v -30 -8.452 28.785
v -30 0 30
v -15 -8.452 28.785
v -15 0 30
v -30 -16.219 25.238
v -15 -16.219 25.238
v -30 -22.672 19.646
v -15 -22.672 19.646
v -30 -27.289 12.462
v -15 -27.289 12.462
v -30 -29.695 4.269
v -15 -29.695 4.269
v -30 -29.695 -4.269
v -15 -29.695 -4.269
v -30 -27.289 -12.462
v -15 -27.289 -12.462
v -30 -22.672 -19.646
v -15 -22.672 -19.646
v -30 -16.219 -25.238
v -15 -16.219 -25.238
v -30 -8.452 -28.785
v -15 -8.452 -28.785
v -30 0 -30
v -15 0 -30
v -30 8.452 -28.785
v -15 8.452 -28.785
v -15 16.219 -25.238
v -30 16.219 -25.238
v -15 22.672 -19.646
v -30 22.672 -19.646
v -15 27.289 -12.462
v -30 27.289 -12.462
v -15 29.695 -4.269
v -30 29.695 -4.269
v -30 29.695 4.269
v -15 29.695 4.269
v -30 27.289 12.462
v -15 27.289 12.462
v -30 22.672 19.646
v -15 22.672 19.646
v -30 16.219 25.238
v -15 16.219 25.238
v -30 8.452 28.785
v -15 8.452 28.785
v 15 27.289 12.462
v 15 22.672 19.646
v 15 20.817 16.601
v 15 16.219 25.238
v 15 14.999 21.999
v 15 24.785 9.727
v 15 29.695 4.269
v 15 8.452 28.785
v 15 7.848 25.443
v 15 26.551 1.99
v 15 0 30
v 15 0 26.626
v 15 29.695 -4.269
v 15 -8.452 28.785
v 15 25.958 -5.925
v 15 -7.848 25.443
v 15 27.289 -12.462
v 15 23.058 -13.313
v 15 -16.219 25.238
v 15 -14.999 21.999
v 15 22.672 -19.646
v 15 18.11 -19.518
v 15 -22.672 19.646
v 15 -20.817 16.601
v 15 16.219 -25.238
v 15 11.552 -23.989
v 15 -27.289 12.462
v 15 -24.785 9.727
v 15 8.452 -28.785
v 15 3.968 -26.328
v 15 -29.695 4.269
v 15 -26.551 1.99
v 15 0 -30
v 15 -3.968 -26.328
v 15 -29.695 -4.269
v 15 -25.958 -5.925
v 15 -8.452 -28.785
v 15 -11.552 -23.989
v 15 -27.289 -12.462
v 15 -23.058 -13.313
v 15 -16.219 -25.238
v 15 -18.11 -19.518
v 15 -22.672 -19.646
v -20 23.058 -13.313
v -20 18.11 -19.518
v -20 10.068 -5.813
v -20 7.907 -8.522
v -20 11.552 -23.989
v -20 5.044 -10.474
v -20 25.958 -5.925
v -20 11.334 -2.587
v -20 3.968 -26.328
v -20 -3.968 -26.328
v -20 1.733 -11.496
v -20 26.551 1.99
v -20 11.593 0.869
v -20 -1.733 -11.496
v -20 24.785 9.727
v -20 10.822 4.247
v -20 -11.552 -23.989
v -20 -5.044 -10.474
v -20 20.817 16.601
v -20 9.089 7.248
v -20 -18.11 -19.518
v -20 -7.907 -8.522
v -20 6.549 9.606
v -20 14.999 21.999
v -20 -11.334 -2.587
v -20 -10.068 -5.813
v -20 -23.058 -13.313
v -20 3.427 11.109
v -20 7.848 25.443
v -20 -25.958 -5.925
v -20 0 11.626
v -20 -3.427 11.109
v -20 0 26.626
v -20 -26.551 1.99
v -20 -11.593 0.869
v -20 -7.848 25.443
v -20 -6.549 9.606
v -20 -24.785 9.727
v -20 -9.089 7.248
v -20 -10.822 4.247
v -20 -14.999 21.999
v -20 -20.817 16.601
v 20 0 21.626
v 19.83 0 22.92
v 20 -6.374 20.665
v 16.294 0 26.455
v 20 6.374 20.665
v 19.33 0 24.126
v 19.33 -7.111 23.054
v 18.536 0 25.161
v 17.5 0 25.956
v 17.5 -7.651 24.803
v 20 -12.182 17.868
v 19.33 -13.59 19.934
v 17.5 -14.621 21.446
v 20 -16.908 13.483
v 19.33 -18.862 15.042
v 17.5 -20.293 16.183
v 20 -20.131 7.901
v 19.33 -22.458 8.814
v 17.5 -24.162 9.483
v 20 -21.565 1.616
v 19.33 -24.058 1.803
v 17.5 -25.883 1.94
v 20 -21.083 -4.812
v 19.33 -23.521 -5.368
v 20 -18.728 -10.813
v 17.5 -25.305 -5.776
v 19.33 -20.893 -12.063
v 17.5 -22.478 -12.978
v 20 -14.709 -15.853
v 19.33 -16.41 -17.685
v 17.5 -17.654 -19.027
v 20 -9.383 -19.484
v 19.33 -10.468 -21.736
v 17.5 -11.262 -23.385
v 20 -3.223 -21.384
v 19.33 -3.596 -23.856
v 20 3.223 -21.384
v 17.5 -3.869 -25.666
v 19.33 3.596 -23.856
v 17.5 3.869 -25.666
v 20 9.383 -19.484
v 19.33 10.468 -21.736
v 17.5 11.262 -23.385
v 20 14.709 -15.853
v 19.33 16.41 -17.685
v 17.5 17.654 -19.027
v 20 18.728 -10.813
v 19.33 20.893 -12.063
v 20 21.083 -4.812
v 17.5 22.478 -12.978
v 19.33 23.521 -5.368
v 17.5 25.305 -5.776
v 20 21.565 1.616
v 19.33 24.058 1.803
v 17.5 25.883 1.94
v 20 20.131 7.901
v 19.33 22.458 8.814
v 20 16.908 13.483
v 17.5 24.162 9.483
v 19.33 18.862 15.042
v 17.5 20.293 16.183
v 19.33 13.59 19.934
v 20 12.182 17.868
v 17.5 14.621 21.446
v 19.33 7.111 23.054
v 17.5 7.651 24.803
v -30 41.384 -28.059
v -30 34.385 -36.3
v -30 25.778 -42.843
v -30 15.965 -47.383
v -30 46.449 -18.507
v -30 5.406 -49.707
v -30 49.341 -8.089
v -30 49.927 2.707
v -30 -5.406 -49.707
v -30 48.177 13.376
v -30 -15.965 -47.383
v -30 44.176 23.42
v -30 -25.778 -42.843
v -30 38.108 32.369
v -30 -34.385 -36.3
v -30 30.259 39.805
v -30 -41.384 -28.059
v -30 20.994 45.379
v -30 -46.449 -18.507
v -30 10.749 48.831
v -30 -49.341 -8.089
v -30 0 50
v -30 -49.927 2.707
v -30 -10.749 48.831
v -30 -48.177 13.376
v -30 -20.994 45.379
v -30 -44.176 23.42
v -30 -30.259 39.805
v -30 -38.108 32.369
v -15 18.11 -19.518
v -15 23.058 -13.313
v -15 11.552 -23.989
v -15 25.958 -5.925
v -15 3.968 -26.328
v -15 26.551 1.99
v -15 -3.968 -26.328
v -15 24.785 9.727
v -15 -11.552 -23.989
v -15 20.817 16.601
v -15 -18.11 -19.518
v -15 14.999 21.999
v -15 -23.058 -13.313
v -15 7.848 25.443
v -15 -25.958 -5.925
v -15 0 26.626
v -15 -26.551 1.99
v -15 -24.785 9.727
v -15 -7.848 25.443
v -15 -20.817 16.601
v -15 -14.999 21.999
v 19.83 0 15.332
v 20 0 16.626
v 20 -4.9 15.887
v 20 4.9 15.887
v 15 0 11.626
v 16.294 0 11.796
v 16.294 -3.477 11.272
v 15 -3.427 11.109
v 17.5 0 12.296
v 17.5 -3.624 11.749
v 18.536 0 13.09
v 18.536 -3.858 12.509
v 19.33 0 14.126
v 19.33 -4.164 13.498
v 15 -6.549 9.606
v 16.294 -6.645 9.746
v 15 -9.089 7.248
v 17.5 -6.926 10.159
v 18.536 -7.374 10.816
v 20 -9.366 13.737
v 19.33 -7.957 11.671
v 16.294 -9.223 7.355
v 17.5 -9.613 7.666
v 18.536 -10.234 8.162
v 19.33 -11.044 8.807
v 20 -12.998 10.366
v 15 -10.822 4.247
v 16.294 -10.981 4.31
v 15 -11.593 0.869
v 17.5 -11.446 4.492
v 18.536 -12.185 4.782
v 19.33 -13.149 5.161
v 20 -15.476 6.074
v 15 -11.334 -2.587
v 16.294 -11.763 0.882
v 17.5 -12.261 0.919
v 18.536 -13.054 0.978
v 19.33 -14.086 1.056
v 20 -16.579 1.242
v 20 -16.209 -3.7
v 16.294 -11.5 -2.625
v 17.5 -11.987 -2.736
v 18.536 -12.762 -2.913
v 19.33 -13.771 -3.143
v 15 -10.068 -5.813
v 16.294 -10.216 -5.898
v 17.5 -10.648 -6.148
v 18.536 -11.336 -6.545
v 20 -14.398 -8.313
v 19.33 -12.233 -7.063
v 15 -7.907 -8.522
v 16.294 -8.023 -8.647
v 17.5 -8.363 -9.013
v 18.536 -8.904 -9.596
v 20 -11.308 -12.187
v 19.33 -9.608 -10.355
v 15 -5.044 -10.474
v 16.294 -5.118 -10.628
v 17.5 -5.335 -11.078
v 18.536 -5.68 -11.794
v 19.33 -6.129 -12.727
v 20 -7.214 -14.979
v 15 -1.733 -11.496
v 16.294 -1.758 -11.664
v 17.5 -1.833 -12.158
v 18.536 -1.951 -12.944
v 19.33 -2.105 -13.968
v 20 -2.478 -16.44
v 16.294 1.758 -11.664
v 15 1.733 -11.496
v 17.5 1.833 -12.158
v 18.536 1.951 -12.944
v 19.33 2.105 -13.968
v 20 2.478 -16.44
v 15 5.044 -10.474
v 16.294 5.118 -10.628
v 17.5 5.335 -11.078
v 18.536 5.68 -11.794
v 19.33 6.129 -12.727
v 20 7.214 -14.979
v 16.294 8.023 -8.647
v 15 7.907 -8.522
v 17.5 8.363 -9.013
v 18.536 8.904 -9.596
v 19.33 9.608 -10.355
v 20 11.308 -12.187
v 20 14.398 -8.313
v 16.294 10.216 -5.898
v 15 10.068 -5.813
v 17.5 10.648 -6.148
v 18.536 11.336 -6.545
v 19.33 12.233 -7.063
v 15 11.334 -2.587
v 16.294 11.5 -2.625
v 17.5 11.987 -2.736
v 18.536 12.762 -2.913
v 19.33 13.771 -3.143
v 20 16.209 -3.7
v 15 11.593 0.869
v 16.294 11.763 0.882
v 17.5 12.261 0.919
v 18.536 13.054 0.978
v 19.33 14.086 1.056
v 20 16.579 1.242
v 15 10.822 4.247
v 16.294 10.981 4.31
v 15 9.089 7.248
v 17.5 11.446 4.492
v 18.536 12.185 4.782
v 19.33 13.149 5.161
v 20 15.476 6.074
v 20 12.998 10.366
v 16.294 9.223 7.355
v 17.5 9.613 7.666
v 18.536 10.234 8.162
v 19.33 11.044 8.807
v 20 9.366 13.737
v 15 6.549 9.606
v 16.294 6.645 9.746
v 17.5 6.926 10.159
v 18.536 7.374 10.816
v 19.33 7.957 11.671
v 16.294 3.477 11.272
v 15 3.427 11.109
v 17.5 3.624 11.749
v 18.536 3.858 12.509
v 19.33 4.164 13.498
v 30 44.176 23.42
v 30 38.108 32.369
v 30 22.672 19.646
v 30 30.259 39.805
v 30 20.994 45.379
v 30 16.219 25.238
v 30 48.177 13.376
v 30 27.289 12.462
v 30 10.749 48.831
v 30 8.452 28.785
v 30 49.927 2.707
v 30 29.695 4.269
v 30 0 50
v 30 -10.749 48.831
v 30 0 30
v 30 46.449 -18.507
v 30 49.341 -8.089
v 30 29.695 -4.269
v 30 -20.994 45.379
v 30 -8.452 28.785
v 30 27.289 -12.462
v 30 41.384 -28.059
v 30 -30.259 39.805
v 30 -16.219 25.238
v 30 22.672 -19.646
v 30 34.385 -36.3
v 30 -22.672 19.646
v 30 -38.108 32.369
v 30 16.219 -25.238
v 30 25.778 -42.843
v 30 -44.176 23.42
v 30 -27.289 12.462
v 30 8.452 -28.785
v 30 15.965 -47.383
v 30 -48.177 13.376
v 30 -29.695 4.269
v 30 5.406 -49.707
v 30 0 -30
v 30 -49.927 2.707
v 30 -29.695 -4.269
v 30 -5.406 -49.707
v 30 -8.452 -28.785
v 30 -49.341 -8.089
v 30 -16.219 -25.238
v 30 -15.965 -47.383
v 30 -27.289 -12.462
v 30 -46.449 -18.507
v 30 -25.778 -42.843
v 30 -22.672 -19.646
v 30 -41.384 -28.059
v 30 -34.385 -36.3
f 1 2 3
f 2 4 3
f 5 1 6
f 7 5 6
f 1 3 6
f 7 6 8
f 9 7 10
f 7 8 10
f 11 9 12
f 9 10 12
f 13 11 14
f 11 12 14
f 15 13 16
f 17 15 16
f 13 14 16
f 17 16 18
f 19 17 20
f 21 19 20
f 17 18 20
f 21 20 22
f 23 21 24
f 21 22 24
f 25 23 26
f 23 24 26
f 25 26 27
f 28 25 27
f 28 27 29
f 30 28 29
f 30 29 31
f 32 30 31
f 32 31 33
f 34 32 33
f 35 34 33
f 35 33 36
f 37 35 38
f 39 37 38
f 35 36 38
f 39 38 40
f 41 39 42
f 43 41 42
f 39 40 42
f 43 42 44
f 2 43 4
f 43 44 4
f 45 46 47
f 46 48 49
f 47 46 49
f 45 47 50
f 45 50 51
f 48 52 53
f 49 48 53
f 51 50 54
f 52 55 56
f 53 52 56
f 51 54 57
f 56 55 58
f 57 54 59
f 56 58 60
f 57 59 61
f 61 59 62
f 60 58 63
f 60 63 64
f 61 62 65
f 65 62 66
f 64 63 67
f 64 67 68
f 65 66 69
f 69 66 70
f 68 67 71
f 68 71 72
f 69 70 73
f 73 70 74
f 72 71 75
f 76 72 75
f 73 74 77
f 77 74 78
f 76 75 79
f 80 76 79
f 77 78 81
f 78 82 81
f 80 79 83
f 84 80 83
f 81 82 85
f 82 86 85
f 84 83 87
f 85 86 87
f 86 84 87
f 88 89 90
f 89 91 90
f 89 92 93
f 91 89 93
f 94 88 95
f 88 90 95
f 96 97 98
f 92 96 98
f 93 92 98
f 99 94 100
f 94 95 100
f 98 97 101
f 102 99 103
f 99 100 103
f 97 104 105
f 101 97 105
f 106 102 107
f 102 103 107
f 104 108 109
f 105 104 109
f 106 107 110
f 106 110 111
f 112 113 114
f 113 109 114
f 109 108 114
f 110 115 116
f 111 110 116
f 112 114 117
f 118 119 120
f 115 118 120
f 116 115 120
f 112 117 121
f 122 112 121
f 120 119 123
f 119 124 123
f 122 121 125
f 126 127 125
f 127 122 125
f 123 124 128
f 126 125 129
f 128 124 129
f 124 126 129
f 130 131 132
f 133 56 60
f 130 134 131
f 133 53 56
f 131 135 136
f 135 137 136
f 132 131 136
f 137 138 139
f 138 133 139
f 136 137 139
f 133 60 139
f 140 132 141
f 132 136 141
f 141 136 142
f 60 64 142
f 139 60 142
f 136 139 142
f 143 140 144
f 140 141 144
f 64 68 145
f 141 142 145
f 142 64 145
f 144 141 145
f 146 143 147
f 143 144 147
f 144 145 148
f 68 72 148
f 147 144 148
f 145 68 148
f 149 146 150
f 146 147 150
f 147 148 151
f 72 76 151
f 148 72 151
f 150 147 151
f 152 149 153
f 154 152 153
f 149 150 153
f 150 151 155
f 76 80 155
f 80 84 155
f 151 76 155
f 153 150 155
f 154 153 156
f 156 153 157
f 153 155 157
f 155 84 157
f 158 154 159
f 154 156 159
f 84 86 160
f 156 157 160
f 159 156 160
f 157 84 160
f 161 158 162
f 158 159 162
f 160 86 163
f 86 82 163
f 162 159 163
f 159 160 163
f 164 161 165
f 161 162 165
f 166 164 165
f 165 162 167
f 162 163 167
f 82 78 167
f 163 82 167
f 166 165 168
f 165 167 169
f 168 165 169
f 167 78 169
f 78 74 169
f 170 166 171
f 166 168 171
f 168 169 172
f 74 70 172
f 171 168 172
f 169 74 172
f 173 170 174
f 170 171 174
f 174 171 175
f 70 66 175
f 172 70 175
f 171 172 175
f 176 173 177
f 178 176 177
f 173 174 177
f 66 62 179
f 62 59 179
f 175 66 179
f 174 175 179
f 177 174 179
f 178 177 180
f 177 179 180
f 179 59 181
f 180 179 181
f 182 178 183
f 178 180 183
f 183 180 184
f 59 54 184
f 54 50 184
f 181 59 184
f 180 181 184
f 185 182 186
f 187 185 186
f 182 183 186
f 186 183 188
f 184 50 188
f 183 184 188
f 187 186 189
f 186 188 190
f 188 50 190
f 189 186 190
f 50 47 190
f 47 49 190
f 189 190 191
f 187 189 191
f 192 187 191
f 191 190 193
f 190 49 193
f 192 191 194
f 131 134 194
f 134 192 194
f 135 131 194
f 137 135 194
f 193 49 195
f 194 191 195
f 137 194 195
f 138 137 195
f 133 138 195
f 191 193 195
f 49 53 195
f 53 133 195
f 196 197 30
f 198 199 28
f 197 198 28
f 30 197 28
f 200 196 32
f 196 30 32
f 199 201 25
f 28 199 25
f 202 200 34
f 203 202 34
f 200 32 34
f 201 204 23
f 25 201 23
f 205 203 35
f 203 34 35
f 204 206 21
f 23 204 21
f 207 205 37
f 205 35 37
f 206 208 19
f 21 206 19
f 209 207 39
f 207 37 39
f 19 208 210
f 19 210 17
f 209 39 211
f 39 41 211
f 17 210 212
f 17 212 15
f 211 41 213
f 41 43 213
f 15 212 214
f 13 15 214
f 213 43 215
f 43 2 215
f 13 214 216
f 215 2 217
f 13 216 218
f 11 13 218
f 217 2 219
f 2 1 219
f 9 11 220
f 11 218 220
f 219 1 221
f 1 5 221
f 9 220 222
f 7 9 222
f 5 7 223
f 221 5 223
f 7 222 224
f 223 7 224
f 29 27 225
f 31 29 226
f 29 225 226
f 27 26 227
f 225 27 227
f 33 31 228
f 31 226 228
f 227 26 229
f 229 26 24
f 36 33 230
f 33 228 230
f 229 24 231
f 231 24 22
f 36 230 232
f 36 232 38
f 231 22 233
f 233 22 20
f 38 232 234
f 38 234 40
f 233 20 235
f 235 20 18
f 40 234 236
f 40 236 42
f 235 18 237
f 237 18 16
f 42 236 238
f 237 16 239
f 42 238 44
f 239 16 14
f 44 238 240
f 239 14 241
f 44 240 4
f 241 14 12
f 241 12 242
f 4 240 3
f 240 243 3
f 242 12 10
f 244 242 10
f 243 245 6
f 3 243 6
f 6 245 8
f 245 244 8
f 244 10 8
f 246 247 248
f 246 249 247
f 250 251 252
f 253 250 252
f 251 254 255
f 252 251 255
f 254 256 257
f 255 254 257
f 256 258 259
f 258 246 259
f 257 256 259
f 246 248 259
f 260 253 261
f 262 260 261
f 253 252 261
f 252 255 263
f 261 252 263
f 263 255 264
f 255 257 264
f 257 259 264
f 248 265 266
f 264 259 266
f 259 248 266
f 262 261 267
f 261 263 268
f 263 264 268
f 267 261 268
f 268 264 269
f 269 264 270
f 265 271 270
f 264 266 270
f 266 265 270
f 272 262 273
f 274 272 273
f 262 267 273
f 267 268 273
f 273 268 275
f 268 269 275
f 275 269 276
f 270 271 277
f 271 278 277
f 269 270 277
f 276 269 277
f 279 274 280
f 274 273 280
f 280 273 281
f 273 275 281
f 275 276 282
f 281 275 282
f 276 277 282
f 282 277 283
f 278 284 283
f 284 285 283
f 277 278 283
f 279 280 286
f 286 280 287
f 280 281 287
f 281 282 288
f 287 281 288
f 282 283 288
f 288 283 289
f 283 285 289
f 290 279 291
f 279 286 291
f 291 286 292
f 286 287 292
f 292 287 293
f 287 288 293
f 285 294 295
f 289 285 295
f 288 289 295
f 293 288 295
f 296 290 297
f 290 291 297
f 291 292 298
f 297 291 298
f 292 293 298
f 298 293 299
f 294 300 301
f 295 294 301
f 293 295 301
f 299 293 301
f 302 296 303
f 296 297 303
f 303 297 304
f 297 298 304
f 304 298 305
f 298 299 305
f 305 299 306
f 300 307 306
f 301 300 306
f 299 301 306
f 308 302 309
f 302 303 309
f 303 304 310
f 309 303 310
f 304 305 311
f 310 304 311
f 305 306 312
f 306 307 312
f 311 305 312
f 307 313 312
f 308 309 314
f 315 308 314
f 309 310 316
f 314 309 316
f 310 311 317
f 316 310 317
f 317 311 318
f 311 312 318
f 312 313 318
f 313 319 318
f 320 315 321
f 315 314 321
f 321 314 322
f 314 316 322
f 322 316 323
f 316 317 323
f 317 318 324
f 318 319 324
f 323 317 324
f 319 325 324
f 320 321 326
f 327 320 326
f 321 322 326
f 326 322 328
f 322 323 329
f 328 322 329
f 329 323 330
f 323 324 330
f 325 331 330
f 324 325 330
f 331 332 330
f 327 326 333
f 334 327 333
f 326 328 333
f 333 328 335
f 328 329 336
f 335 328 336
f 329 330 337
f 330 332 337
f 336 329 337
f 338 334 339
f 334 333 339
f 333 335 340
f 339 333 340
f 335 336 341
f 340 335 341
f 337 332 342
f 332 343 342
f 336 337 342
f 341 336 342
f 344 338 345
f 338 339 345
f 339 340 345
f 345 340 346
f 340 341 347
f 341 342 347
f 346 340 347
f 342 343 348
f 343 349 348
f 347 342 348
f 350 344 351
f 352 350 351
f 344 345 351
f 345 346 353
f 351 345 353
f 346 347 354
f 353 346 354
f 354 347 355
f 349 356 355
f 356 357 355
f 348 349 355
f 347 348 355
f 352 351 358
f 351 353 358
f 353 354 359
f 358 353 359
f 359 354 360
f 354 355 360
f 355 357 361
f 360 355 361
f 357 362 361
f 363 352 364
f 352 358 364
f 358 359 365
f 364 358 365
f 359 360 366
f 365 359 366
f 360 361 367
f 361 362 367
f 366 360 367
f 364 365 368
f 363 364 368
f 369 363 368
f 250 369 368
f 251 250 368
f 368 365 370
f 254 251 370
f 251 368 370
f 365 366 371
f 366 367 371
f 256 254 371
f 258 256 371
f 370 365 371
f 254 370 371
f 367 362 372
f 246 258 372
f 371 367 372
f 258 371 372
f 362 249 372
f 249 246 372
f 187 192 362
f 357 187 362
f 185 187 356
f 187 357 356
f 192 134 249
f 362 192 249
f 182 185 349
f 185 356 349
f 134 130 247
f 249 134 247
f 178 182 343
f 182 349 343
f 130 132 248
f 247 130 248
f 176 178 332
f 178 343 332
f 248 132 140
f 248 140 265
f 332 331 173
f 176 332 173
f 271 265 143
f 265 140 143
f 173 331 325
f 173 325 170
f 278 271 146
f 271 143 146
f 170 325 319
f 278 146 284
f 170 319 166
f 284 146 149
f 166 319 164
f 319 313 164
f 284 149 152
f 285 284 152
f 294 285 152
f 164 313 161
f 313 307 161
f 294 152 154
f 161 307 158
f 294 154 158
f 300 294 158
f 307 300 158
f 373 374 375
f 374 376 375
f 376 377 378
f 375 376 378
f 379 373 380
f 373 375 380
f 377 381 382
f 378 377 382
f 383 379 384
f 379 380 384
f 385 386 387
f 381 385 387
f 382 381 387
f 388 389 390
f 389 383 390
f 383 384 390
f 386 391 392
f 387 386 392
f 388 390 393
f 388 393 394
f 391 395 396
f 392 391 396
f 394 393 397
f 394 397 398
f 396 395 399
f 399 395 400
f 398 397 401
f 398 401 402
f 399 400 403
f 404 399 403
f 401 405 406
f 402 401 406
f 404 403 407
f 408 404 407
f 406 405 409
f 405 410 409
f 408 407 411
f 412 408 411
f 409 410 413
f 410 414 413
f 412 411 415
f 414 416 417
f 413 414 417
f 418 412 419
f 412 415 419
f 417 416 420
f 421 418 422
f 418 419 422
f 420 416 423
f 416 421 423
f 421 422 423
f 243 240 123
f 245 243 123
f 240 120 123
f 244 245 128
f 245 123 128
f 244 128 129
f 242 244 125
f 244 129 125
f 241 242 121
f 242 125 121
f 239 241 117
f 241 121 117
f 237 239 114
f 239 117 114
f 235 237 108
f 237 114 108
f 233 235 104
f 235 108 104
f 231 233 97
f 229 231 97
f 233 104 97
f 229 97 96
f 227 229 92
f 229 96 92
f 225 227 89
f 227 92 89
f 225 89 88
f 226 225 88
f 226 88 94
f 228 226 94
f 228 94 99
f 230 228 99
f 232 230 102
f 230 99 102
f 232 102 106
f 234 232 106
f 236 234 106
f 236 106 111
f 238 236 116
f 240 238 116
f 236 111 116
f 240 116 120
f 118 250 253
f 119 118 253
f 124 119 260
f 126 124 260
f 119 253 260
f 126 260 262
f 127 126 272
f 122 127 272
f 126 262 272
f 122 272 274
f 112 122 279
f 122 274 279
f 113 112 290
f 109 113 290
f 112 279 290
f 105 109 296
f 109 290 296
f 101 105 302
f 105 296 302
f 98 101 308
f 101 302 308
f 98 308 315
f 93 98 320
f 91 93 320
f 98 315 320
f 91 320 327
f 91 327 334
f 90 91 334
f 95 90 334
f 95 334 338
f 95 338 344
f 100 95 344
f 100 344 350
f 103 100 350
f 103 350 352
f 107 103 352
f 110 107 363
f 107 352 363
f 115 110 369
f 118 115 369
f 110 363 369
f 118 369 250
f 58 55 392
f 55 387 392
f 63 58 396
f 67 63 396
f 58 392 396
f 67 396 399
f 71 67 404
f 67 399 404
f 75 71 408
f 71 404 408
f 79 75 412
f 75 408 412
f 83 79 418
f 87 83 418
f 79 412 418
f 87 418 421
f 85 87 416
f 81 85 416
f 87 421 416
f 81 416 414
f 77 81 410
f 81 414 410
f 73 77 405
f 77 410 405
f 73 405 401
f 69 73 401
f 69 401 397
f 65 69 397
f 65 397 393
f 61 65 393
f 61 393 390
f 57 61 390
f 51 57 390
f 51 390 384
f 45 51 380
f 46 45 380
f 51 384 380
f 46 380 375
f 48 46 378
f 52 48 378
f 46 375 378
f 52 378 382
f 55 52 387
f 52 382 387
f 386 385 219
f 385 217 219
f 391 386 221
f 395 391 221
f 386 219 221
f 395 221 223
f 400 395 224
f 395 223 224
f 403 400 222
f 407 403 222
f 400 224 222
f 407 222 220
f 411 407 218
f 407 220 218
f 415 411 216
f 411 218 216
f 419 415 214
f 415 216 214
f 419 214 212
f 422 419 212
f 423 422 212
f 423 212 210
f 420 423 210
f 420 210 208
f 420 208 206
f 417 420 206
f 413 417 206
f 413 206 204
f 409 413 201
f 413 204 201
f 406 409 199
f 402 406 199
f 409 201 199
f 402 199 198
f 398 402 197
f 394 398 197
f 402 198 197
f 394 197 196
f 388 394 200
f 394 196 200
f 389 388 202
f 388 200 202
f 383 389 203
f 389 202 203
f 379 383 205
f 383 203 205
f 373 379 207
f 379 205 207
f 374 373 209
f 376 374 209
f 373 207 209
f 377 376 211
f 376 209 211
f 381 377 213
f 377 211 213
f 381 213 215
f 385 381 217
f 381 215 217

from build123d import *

# Parameters (mm, degrees)
F2_R = 4.99999


# Not quite as in the source:
# - a fillet or chamfer is up to 0.001 mm smaller than in the source, because OpenCascade refuses the exact size


with BuildPart() as f1:
    # F0 (on Front) → F1 (revolve)
    with BuildSketch(Plane.XZ):
        Polygon((-20, 11.6256596521), (0, 11.6256596521), (20, 11.6256596521), (20, 26.6256596521), (15, 26.6256596521), (15, 30), (30, 30), (30, 50), (0, 50), (-30, 50), (-30, 30), (-15, 30), (-15, 26.6256596521), (-20, 26.6256596521), align=None)
    revolve(axis=Axis((30.7941585779, 0, 0), (1, 0, 0)))

    # F2 (radius 5 in the source; OpenCascade refuses exactly that, so slightly less here)
    f2_edges = [f1.edges().sort_by_distance(p)[0] for p in [
        (20, 0, -11.62566),
        (20, 0, -26.62566),
    ]]
    fillet(f2_edges, radius=F2_R)


solid = f1.part
